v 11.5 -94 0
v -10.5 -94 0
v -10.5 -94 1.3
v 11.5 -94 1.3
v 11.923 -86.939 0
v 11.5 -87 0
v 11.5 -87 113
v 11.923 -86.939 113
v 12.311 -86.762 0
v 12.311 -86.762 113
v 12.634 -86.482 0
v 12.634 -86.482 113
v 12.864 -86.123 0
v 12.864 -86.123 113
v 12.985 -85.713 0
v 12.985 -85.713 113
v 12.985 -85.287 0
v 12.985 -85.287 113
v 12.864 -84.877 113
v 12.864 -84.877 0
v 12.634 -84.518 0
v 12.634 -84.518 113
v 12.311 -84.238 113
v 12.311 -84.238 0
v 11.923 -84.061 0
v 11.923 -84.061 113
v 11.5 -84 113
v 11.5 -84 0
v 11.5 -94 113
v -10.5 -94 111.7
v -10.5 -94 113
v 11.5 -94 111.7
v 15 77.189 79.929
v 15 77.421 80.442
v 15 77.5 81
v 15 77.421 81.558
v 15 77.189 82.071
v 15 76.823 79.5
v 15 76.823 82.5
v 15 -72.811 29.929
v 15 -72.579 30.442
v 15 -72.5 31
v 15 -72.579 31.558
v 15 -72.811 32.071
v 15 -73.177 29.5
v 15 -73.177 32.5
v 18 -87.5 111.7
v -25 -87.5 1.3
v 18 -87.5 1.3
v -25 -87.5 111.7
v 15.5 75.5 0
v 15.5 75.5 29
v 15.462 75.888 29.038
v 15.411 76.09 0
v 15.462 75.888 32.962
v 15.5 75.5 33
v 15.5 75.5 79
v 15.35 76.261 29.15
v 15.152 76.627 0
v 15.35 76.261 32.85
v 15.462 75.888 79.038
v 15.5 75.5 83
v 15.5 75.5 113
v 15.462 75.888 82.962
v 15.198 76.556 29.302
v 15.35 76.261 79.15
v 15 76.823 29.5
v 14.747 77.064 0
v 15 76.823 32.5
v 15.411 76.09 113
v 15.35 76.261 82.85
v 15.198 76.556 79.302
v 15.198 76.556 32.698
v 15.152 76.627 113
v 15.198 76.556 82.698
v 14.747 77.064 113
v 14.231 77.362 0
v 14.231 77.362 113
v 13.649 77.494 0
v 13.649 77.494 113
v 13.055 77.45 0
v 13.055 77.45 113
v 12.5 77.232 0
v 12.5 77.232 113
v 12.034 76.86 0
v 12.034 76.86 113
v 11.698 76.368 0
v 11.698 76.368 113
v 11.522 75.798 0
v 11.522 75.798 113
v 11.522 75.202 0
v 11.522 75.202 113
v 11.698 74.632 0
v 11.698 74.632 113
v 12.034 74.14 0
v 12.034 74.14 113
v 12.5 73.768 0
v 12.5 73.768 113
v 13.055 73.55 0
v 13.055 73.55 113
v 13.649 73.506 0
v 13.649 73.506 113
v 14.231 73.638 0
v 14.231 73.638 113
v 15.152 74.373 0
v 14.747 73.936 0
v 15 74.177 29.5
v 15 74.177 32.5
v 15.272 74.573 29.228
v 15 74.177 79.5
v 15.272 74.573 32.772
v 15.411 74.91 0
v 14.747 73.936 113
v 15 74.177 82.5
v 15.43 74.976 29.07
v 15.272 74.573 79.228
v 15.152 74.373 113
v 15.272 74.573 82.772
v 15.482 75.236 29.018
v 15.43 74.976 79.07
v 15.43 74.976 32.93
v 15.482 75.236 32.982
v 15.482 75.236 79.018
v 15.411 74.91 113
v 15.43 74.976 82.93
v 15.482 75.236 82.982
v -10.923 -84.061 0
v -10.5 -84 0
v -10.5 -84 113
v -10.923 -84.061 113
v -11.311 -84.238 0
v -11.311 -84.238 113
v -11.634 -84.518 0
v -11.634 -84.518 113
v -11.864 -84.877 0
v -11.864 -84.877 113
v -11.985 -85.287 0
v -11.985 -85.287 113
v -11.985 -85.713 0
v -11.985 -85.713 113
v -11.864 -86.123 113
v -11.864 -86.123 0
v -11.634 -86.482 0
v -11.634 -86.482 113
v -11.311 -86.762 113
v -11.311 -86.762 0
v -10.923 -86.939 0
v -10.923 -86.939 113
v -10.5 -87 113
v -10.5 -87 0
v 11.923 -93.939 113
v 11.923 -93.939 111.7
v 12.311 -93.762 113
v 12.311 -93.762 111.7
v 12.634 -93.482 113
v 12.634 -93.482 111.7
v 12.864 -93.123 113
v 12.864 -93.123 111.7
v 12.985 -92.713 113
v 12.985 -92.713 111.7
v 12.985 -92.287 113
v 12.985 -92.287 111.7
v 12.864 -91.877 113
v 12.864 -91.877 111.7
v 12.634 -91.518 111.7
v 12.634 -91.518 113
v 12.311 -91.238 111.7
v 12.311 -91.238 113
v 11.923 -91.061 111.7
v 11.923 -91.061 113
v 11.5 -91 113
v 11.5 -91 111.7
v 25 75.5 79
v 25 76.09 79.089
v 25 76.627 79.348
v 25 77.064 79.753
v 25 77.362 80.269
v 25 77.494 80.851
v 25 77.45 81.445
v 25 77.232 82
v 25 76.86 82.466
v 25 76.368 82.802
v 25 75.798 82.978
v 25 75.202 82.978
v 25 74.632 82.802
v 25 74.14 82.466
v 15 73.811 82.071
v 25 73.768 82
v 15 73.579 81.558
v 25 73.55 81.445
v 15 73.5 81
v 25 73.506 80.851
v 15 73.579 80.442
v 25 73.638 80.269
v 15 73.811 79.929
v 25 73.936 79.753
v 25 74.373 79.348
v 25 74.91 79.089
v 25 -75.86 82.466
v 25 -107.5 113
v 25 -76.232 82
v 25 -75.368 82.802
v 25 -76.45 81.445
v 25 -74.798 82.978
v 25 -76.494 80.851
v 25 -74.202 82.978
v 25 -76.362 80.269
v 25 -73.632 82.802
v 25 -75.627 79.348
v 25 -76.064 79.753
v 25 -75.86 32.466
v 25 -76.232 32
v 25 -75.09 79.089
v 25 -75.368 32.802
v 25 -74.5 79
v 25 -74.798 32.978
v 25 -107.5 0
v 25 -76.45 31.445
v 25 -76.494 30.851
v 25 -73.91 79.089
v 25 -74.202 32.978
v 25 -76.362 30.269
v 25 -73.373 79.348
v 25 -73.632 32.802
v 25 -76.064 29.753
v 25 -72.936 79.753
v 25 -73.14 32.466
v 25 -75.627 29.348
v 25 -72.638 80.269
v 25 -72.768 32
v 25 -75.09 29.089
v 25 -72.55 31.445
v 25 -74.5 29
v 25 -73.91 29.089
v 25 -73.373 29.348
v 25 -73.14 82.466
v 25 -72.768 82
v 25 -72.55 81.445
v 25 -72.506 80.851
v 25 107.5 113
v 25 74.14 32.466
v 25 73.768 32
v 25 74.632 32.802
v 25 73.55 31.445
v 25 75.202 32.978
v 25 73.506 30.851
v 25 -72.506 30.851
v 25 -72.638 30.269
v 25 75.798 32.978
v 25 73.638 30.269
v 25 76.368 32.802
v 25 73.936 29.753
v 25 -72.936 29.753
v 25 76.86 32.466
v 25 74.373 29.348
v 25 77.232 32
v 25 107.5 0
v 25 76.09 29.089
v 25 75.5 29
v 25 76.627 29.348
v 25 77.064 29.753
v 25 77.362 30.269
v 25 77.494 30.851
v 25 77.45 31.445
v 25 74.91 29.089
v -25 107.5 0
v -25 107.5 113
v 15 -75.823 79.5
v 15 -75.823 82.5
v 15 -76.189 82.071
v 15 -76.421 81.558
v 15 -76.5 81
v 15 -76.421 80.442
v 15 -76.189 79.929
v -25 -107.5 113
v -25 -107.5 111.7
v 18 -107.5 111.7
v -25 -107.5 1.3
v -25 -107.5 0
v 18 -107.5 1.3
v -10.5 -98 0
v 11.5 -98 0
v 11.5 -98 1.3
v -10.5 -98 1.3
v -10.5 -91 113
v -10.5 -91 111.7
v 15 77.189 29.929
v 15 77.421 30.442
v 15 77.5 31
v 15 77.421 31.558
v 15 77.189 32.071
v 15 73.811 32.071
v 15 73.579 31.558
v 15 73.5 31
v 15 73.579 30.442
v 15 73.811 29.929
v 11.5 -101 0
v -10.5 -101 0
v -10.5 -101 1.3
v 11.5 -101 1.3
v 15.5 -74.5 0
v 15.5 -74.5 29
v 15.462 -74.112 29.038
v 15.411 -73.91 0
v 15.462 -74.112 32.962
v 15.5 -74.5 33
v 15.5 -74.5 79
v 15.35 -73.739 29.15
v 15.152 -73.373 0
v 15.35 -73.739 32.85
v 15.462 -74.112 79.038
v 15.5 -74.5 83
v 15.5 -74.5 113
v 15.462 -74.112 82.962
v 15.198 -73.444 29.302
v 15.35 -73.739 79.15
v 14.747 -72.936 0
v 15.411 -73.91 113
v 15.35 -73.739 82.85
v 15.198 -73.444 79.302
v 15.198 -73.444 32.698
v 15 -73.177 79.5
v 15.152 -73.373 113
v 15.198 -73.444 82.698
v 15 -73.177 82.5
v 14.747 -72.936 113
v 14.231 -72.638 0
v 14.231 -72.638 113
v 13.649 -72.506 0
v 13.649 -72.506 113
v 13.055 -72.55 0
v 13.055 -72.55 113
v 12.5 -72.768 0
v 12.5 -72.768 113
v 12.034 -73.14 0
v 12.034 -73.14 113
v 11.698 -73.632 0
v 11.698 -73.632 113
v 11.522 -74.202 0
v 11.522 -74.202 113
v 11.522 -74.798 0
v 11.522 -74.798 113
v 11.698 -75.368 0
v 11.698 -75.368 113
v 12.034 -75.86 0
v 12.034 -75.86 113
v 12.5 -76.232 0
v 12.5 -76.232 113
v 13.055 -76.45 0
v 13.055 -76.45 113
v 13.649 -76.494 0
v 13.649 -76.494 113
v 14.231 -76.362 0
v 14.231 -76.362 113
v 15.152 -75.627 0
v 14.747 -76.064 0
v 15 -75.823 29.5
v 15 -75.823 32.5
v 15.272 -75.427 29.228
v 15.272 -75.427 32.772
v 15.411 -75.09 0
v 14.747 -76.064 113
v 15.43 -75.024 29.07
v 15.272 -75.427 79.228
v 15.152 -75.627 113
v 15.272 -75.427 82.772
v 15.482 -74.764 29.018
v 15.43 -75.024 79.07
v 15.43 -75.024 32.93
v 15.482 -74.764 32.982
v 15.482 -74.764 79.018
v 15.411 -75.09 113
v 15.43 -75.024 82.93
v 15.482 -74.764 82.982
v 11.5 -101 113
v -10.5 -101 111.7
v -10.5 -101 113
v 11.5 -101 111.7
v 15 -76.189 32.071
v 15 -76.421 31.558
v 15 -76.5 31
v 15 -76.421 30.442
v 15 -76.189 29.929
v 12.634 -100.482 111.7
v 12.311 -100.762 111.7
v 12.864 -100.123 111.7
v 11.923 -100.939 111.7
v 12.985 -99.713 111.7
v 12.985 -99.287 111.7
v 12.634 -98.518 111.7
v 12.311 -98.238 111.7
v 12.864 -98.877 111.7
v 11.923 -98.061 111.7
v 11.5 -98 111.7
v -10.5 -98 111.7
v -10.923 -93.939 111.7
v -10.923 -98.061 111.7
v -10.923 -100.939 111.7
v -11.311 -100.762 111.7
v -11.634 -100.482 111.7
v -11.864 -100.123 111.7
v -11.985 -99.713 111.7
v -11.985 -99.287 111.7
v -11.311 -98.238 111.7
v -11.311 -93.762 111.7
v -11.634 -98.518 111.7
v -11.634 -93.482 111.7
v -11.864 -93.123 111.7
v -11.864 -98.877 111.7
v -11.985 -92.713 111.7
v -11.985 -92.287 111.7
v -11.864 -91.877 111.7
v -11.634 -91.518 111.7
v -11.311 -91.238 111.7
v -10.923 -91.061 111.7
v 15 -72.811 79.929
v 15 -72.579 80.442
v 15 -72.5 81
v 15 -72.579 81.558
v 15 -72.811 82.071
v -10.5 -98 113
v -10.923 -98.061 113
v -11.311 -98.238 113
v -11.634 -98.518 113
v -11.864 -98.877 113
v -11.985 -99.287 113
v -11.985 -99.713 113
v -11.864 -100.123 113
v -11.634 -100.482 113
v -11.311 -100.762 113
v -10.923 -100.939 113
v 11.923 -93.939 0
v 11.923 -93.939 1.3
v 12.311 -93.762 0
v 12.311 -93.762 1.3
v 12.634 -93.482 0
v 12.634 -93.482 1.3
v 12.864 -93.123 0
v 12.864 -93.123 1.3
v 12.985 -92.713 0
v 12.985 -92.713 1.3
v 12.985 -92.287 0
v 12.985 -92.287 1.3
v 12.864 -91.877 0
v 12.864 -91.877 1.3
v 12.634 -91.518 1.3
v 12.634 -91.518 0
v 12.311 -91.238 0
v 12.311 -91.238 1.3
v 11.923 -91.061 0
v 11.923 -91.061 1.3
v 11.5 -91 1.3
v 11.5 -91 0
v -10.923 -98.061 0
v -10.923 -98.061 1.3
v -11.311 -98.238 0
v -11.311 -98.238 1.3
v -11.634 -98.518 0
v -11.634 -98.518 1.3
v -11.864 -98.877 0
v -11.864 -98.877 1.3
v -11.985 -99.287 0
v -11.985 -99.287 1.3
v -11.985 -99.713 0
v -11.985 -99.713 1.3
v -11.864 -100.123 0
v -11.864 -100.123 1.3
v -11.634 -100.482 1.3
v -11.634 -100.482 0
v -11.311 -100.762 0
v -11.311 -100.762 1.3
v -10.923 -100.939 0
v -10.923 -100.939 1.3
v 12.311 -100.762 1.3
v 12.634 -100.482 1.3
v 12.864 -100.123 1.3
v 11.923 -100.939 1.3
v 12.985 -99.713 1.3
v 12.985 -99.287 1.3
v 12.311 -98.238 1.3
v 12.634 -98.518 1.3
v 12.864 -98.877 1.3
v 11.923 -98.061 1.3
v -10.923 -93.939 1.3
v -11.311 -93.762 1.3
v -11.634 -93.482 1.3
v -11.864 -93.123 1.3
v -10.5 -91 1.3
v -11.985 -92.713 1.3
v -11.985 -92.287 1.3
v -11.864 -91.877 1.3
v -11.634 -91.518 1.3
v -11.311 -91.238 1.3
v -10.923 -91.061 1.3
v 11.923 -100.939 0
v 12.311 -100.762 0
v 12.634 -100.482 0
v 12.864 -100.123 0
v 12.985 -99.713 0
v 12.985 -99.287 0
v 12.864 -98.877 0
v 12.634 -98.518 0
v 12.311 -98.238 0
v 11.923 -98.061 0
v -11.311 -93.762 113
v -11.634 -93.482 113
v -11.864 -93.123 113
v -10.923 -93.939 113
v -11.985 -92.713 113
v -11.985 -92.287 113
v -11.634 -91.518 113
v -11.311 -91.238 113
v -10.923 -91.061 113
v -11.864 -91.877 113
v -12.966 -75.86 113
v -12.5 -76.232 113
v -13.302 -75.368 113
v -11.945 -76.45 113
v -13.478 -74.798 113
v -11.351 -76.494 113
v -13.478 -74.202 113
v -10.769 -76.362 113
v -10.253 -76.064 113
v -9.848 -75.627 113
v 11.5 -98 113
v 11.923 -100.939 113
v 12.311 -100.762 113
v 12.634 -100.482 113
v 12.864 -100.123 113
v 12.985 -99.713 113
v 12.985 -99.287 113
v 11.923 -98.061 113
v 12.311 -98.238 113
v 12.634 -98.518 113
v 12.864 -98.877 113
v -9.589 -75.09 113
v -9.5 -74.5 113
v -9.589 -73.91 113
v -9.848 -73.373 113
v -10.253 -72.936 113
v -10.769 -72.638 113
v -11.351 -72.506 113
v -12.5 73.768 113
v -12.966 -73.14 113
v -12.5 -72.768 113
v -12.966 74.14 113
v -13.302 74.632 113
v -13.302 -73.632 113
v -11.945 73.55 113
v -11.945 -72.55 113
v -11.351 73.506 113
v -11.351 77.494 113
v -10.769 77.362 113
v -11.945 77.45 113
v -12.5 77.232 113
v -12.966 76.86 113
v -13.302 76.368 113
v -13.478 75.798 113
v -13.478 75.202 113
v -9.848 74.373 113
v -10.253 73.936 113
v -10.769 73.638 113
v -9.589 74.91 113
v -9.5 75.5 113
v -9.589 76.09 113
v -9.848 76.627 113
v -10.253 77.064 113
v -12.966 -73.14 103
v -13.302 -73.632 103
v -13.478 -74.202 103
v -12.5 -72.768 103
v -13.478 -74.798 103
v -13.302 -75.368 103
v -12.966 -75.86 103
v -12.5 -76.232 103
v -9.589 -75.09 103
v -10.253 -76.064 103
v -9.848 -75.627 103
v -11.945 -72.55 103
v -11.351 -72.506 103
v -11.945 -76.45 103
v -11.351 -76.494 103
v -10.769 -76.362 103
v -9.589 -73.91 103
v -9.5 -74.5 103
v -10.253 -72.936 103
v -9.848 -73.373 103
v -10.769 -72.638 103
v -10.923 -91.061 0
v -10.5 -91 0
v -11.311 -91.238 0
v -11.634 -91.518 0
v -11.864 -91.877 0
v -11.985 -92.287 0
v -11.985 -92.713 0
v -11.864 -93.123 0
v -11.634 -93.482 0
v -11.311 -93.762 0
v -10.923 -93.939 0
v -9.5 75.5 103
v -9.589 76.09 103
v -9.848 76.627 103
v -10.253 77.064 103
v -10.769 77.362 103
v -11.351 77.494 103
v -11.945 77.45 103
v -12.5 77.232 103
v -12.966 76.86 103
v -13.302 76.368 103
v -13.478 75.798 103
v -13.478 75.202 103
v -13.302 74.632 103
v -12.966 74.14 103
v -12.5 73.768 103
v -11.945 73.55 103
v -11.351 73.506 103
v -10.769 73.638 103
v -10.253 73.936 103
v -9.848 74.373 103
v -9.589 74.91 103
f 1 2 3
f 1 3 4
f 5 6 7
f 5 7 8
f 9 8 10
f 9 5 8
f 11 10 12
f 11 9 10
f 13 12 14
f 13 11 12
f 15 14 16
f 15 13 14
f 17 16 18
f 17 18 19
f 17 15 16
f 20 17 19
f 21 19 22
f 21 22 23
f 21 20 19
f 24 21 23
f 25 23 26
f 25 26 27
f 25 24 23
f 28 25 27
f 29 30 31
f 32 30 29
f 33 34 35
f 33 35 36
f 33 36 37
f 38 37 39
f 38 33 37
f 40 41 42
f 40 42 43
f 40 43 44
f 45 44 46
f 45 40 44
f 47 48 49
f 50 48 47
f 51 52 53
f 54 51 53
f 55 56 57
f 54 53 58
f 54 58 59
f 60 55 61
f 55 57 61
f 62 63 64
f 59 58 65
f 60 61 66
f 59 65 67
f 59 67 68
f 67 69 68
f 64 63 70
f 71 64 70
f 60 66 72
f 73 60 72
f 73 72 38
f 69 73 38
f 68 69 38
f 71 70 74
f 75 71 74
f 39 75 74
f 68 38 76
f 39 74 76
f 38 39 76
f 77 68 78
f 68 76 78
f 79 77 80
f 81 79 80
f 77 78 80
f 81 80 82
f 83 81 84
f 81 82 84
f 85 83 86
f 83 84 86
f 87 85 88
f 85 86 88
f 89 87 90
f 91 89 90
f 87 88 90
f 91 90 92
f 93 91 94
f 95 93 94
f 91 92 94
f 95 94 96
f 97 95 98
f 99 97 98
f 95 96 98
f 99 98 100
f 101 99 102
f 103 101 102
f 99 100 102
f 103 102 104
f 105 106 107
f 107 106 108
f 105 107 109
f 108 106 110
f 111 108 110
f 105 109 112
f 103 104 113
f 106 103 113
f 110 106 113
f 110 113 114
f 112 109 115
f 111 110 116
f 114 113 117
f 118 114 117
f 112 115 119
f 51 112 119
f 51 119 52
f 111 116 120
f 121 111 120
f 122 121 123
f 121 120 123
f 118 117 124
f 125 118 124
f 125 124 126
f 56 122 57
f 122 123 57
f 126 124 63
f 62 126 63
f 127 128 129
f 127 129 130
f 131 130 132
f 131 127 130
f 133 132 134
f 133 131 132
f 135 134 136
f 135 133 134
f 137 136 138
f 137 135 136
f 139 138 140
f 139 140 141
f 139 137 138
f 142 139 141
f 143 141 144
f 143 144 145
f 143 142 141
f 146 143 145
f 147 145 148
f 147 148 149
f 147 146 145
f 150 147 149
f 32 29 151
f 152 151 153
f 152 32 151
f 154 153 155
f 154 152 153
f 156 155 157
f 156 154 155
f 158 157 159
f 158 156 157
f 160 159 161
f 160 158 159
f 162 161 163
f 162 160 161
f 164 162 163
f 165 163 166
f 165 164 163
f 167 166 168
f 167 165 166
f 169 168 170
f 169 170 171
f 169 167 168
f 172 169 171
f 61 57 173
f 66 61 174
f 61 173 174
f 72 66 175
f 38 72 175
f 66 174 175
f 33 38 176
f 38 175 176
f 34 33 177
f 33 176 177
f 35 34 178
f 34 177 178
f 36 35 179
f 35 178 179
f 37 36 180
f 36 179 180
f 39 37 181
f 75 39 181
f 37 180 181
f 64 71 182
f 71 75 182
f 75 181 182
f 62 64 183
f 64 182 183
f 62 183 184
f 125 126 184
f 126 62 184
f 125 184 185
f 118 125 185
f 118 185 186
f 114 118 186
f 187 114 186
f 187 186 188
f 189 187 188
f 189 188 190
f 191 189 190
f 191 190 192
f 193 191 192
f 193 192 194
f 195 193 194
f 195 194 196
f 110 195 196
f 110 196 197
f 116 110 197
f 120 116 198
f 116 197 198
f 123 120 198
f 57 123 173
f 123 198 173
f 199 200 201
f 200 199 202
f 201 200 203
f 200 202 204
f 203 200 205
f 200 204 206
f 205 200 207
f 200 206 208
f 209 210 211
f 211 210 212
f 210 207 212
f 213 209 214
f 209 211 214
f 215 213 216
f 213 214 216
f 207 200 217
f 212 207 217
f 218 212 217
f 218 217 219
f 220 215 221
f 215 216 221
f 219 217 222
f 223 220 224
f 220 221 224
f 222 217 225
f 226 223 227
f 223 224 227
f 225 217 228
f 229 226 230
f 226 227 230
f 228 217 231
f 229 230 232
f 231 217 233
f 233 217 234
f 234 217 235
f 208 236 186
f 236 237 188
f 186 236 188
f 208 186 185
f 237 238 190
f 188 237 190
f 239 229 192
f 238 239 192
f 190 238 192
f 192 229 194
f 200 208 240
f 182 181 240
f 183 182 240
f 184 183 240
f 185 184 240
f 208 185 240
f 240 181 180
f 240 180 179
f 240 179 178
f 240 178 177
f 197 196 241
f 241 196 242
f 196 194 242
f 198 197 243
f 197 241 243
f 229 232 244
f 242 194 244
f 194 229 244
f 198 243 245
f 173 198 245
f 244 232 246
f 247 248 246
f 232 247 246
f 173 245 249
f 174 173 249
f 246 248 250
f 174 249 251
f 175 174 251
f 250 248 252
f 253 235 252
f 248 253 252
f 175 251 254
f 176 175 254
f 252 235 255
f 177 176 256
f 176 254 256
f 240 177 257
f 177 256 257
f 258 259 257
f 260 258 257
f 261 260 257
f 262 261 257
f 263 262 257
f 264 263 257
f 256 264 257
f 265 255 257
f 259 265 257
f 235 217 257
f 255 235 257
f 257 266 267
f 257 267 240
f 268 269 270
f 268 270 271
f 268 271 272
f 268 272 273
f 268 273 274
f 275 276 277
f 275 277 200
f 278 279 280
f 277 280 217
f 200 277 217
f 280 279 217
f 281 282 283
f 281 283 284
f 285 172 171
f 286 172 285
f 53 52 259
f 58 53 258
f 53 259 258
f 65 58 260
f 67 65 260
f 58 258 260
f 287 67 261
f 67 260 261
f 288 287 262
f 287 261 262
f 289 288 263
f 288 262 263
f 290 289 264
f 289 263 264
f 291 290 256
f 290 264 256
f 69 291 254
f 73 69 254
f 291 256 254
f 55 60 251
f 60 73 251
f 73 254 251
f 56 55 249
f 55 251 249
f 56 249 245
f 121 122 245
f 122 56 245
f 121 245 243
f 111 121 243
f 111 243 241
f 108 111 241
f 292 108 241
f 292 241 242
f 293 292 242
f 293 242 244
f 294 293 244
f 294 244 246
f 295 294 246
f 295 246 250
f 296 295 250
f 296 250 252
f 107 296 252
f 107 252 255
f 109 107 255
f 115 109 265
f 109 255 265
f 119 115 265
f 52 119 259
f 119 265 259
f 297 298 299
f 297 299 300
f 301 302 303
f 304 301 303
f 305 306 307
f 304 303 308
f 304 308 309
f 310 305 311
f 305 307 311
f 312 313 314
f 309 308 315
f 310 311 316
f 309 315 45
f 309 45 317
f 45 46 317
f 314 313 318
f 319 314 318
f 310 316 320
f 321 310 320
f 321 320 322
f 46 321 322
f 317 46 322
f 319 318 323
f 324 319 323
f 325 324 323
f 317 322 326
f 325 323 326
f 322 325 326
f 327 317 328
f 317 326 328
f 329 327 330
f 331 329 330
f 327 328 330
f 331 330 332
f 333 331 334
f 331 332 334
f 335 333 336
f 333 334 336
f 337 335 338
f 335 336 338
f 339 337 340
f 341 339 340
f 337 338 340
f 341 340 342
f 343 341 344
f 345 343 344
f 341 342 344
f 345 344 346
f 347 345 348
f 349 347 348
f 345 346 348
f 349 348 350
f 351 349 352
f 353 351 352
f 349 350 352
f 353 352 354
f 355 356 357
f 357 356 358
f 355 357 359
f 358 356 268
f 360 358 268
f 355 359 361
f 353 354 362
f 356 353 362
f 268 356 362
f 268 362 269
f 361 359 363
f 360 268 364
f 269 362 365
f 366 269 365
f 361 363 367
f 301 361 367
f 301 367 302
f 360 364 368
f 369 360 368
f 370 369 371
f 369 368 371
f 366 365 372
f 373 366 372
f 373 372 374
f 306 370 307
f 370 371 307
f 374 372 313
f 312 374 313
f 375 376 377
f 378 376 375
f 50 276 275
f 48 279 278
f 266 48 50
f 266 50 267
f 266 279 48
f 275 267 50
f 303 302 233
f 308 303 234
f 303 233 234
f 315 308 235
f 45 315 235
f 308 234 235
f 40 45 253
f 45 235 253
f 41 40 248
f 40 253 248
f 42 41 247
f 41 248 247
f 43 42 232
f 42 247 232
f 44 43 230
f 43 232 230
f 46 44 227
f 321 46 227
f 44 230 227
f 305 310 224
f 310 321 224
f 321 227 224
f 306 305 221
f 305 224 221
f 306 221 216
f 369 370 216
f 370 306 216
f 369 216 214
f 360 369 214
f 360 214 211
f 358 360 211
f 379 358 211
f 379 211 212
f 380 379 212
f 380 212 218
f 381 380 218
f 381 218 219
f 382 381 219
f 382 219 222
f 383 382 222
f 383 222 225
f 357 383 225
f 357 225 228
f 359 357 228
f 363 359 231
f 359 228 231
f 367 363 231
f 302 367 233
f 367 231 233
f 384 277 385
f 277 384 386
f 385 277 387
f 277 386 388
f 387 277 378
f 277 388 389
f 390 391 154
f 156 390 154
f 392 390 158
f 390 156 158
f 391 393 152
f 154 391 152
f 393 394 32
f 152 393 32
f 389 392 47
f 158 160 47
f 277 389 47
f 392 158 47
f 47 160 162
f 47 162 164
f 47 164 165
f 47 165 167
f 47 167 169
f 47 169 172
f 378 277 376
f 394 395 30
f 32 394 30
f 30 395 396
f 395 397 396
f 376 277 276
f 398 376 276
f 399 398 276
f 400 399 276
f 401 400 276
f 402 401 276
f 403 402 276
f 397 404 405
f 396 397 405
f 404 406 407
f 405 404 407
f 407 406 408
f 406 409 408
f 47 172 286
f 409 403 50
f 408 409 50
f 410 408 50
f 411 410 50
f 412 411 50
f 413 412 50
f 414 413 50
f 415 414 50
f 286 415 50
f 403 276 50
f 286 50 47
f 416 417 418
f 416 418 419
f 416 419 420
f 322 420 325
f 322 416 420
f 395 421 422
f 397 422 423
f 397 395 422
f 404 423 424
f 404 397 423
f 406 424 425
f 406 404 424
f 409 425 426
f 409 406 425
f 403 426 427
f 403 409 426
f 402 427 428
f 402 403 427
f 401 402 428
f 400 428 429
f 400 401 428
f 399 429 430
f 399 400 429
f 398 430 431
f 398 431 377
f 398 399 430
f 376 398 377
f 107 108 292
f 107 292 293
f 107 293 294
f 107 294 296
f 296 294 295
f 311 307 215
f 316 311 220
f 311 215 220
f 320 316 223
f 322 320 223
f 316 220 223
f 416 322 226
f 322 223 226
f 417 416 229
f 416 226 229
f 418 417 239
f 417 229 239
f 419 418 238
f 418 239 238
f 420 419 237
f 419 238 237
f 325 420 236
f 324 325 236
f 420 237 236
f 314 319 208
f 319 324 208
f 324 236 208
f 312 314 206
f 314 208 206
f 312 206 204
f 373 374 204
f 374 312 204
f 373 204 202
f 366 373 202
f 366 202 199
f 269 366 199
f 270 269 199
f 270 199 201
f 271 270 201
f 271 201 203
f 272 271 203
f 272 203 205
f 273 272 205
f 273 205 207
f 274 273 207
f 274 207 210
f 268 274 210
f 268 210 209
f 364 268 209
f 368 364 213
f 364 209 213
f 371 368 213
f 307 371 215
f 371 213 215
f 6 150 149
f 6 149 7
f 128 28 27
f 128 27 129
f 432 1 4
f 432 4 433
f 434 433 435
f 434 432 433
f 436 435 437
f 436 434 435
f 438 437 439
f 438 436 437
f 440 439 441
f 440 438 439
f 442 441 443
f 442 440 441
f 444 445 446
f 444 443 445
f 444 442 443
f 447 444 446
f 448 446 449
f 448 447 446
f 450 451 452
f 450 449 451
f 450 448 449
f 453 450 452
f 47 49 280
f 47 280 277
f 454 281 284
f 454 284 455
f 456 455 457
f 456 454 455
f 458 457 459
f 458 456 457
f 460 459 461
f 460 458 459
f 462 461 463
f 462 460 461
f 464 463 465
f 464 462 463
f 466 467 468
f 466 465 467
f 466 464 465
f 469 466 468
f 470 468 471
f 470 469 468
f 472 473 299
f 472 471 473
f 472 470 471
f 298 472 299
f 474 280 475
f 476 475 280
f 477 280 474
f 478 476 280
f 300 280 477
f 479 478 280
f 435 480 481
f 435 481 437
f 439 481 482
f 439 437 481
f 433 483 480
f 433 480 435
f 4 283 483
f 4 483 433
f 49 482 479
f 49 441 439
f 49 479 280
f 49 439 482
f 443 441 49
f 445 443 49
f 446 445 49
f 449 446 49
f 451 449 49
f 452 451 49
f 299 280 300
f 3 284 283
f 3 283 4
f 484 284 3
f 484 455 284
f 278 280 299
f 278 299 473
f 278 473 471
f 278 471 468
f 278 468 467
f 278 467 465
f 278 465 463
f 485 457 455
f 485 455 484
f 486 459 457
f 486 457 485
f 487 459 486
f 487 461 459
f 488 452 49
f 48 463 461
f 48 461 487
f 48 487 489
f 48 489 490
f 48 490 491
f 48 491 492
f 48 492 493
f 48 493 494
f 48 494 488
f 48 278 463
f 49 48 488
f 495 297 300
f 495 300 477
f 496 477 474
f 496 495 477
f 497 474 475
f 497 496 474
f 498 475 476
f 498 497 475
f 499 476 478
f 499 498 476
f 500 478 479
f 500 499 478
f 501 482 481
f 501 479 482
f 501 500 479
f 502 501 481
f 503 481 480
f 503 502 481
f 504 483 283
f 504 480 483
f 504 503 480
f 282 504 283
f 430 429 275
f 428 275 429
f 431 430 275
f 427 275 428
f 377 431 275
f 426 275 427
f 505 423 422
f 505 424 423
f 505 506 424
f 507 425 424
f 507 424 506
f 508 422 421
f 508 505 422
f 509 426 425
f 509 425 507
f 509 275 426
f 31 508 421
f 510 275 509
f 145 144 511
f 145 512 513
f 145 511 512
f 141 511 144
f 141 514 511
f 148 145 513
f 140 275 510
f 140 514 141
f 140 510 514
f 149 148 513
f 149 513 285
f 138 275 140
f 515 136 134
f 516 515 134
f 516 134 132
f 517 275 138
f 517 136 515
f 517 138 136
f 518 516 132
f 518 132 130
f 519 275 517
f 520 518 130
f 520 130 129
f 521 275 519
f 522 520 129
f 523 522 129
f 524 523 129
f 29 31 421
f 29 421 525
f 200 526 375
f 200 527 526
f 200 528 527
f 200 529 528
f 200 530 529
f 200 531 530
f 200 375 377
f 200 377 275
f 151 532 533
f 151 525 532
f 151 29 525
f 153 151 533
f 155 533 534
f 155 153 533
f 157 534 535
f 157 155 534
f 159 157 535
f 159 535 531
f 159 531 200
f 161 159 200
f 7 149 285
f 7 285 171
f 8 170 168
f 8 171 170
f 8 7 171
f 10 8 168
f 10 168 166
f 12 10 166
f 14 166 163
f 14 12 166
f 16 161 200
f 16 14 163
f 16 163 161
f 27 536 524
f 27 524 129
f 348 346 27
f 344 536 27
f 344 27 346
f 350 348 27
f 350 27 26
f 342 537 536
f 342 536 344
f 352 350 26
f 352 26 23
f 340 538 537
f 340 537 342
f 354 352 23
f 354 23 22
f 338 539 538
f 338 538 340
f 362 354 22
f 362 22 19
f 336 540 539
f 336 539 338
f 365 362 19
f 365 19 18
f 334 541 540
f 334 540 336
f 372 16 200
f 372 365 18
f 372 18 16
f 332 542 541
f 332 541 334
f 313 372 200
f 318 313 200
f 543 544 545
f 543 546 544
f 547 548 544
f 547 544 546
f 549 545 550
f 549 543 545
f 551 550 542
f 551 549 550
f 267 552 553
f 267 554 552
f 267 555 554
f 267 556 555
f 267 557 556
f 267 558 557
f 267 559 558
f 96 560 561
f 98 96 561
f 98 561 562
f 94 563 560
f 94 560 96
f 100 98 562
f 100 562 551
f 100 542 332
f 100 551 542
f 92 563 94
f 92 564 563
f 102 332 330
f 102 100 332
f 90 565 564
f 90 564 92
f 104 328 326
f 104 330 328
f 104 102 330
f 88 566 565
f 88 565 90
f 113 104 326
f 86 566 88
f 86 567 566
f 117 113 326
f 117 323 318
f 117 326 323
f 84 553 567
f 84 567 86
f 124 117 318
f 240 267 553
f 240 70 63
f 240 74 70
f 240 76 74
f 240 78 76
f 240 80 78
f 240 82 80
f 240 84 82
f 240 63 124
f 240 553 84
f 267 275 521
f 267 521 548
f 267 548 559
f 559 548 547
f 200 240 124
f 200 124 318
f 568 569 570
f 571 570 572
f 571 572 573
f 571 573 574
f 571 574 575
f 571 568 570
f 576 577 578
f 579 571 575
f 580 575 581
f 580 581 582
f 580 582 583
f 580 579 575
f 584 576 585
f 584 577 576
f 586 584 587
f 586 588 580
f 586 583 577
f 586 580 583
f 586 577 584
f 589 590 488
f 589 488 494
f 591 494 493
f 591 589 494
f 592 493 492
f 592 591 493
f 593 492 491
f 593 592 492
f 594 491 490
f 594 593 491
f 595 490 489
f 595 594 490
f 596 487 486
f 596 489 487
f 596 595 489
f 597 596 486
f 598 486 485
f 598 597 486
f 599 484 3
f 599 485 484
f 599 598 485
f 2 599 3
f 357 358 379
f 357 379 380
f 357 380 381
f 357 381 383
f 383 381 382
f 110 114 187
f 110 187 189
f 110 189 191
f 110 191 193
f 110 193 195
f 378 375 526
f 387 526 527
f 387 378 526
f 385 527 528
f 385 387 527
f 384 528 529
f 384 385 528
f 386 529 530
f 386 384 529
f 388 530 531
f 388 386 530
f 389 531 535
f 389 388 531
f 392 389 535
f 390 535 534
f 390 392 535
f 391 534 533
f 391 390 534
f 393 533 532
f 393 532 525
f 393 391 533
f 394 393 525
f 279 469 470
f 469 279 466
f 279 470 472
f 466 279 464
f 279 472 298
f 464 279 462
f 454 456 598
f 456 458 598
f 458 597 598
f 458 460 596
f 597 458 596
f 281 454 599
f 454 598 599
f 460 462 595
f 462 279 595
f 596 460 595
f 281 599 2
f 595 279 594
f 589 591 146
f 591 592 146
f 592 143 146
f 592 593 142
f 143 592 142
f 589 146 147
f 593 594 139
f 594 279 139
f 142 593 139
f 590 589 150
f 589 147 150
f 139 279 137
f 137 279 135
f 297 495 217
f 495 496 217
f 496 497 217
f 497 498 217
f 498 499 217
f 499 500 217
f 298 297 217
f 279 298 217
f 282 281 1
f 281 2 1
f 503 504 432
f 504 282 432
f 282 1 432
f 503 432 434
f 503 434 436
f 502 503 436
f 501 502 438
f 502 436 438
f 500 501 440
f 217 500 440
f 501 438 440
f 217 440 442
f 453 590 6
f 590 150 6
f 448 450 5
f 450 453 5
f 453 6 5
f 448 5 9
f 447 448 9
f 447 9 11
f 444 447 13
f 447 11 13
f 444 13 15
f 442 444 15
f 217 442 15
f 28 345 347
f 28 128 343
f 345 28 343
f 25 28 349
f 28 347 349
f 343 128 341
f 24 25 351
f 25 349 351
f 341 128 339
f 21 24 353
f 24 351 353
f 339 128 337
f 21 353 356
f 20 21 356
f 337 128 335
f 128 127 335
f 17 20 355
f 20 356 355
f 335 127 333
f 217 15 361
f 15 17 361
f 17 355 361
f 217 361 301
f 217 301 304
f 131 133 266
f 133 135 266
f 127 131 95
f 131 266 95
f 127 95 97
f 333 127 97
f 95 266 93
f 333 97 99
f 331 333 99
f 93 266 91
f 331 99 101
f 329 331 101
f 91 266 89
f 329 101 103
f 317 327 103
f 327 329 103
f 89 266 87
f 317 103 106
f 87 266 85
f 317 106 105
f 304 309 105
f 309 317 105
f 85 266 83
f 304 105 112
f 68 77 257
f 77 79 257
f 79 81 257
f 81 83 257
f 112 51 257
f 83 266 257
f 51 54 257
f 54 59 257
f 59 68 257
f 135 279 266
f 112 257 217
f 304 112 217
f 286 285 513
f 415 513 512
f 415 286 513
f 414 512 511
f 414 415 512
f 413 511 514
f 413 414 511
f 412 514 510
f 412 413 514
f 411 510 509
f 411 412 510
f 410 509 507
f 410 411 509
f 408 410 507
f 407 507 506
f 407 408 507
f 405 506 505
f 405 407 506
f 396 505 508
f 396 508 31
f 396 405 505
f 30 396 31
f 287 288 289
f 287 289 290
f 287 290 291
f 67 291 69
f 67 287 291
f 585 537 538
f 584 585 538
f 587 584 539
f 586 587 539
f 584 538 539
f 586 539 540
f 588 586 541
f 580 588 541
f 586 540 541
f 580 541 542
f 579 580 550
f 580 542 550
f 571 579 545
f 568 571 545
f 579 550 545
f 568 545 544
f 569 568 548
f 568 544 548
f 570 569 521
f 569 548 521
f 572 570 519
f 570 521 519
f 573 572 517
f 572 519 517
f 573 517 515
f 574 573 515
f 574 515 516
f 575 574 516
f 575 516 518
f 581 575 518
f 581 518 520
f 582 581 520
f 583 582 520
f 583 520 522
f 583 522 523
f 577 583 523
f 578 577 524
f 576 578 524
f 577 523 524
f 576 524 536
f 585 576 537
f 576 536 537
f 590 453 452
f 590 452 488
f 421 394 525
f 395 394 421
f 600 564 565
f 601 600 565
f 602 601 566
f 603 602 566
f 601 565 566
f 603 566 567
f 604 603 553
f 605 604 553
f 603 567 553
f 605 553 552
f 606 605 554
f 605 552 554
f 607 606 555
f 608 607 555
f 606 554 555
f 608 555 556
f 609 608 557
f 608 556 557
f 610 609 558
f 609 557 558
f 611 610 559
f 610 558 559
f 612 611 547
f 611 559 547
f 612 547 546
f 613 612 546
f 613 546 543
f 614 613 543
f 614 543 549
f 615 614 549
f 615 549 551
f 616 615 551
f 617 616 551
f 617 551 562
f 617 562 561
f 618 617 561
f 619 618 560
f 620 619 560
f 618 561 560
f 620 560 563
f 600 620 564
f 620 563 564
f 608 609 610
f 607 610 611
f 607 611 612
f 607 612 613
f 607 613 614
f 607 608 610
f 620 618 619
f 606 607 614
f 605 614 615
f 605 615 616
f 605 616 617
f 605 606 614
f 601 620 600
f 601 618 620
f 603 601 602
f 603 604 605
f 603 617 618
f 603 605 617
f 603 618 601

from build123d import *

# Parameters (mm, degrees)
ESBO_O1_W                = 50
ESBO_O1_H                = 215
RESSALTO_EXTRUS_O1_DEPTH = 113
CORTE_EXTRUS_O1_DEPTH    = 113
ESBO_O3_W                = 110.4
ESBO_O3_H                = 20
CORTE_EXTRUS_O2_DEPTH    = 43
ESBO_O4_R                = 2
CORTE_EXTRUS_O3_DEPTH    = 113
ESBO_O5_R                = 2
CORTE_EXTRUS_O4_DEPTH    = 10
ESBO_O6_R                = 2
CORTE_EXTRUS_O5_DEPTH    = 10


with BuildPart() as part:
    # Esboço1 → Ressalto-extrusão1 (new body)
    with BuildSketch(Plane.XY):
        Rectangle(ESBO_O1_W, ESBO_O1_H)
    extrude(amount=RESSALTO_EXTRUS_O1_DEPTH)

    # Esboço2 → Corte-extrusão1 (cut)
    with BuildSketch(Plane(origin=(0, 0, 0), x_dir=(-1, 0, 0), z_dir=(0, 0, -1))):
        with BuildLine():
            Line((-11.5, -98), (10.5, -98))
            ThreePointArc((10.5, -98), (12, -99.5), (10.5, -101))
            Line((10.5, -101), (-11.5, -101))
            ThreePointArc((-11.5, -101), (-13, -99.5), (-11.5, -98))
        make_face()
        with BuildLine():
            Line((-11.5, -91), (10.5, -91))
            ThreePointArc((10.5, -91), (12, -92.5), (10.5, -94))
            Line((10.5, -94), (-11.5, -94))
            ThreePointArc((-11.5, -94), (-13, -92.5), (-11.5, -91))
        make_face()
        with BuildLine():
            Line((-11.5, -84), (10.5, -84))
            ThreePointArc((10.5, -84), (12, -85.5), (10.5, -87))
            Line((10.5, -87), (-11.5, -87))
            ThreePointArc((-11.5, -87), (-13, -85.5), (-11.5, -84))
        make_face()
    extrude(amount=-CORTE_EXTRUS_O1_DEPTH, mode=Mode.SUBTRACT)

    # Esboço3 → Corte-extrusão2 (cut)
    with BuildSketch(Plane.ZY.offset(25)):
        with Locations((56.5, -97.5)):
            Rectangle(ESBO_O3_W, ESBO_O3_H)
    extrude(amount=-CORTE_EXTRUS_O2_DEPTH, mode=Mode.SUBTRACT)

    # Esboço4 → Corte-extrusão3 (cut)
    with BuildSketch(Plane.XY.offset(113)):
        with Locations((13.5, -74.5)):
            Circle(ESBO_O4_R)
        with Locations((13.5, 75.5)):
            Circle(ESBO_O4_R)
    extrude(amount=-CORTE_EXTRUS_O3_DEPTH, mode=Mode.SUBTRACT)

    # Esboço5 → Corte-extrusão4 (cut)
    with BuildSketch(Plane.XY.offset(113)):
        with Locations((-11.5, 75.5)):
            Circle(ESBO_O5_R)
        with Locations((-11.5, -74.5)):
            Circle(ESBO_O5_R)
    extrude(amount=-CORTE_EXTRUS_O4_DEPTH, mode=Mode.SUBTRACT)

    # Esboço6 → Corte-extrusão5 (cut)
    with BuildSketch(Plane(origin=(25, 0, 0), x_dir=(0, 0, -1), z_dir=(1, 0, 0))):
        with Locations((-31, -74.5)):
            Circle(ESBO_O6_R)
        with Locations((-81, -74.5)):
            Circle(ESBO_O6_R)
        with Locations((-31, 75.5)):
            Circle(ESBO_O6_R)
        with Locations((-81, 75.5)):
            Circle(ESBO_O6_R)
    extrude(amount=-CORTE_EXTRUS_O5_DEPTH, mode=Mode.SUBTRACT)


solid = part.part
